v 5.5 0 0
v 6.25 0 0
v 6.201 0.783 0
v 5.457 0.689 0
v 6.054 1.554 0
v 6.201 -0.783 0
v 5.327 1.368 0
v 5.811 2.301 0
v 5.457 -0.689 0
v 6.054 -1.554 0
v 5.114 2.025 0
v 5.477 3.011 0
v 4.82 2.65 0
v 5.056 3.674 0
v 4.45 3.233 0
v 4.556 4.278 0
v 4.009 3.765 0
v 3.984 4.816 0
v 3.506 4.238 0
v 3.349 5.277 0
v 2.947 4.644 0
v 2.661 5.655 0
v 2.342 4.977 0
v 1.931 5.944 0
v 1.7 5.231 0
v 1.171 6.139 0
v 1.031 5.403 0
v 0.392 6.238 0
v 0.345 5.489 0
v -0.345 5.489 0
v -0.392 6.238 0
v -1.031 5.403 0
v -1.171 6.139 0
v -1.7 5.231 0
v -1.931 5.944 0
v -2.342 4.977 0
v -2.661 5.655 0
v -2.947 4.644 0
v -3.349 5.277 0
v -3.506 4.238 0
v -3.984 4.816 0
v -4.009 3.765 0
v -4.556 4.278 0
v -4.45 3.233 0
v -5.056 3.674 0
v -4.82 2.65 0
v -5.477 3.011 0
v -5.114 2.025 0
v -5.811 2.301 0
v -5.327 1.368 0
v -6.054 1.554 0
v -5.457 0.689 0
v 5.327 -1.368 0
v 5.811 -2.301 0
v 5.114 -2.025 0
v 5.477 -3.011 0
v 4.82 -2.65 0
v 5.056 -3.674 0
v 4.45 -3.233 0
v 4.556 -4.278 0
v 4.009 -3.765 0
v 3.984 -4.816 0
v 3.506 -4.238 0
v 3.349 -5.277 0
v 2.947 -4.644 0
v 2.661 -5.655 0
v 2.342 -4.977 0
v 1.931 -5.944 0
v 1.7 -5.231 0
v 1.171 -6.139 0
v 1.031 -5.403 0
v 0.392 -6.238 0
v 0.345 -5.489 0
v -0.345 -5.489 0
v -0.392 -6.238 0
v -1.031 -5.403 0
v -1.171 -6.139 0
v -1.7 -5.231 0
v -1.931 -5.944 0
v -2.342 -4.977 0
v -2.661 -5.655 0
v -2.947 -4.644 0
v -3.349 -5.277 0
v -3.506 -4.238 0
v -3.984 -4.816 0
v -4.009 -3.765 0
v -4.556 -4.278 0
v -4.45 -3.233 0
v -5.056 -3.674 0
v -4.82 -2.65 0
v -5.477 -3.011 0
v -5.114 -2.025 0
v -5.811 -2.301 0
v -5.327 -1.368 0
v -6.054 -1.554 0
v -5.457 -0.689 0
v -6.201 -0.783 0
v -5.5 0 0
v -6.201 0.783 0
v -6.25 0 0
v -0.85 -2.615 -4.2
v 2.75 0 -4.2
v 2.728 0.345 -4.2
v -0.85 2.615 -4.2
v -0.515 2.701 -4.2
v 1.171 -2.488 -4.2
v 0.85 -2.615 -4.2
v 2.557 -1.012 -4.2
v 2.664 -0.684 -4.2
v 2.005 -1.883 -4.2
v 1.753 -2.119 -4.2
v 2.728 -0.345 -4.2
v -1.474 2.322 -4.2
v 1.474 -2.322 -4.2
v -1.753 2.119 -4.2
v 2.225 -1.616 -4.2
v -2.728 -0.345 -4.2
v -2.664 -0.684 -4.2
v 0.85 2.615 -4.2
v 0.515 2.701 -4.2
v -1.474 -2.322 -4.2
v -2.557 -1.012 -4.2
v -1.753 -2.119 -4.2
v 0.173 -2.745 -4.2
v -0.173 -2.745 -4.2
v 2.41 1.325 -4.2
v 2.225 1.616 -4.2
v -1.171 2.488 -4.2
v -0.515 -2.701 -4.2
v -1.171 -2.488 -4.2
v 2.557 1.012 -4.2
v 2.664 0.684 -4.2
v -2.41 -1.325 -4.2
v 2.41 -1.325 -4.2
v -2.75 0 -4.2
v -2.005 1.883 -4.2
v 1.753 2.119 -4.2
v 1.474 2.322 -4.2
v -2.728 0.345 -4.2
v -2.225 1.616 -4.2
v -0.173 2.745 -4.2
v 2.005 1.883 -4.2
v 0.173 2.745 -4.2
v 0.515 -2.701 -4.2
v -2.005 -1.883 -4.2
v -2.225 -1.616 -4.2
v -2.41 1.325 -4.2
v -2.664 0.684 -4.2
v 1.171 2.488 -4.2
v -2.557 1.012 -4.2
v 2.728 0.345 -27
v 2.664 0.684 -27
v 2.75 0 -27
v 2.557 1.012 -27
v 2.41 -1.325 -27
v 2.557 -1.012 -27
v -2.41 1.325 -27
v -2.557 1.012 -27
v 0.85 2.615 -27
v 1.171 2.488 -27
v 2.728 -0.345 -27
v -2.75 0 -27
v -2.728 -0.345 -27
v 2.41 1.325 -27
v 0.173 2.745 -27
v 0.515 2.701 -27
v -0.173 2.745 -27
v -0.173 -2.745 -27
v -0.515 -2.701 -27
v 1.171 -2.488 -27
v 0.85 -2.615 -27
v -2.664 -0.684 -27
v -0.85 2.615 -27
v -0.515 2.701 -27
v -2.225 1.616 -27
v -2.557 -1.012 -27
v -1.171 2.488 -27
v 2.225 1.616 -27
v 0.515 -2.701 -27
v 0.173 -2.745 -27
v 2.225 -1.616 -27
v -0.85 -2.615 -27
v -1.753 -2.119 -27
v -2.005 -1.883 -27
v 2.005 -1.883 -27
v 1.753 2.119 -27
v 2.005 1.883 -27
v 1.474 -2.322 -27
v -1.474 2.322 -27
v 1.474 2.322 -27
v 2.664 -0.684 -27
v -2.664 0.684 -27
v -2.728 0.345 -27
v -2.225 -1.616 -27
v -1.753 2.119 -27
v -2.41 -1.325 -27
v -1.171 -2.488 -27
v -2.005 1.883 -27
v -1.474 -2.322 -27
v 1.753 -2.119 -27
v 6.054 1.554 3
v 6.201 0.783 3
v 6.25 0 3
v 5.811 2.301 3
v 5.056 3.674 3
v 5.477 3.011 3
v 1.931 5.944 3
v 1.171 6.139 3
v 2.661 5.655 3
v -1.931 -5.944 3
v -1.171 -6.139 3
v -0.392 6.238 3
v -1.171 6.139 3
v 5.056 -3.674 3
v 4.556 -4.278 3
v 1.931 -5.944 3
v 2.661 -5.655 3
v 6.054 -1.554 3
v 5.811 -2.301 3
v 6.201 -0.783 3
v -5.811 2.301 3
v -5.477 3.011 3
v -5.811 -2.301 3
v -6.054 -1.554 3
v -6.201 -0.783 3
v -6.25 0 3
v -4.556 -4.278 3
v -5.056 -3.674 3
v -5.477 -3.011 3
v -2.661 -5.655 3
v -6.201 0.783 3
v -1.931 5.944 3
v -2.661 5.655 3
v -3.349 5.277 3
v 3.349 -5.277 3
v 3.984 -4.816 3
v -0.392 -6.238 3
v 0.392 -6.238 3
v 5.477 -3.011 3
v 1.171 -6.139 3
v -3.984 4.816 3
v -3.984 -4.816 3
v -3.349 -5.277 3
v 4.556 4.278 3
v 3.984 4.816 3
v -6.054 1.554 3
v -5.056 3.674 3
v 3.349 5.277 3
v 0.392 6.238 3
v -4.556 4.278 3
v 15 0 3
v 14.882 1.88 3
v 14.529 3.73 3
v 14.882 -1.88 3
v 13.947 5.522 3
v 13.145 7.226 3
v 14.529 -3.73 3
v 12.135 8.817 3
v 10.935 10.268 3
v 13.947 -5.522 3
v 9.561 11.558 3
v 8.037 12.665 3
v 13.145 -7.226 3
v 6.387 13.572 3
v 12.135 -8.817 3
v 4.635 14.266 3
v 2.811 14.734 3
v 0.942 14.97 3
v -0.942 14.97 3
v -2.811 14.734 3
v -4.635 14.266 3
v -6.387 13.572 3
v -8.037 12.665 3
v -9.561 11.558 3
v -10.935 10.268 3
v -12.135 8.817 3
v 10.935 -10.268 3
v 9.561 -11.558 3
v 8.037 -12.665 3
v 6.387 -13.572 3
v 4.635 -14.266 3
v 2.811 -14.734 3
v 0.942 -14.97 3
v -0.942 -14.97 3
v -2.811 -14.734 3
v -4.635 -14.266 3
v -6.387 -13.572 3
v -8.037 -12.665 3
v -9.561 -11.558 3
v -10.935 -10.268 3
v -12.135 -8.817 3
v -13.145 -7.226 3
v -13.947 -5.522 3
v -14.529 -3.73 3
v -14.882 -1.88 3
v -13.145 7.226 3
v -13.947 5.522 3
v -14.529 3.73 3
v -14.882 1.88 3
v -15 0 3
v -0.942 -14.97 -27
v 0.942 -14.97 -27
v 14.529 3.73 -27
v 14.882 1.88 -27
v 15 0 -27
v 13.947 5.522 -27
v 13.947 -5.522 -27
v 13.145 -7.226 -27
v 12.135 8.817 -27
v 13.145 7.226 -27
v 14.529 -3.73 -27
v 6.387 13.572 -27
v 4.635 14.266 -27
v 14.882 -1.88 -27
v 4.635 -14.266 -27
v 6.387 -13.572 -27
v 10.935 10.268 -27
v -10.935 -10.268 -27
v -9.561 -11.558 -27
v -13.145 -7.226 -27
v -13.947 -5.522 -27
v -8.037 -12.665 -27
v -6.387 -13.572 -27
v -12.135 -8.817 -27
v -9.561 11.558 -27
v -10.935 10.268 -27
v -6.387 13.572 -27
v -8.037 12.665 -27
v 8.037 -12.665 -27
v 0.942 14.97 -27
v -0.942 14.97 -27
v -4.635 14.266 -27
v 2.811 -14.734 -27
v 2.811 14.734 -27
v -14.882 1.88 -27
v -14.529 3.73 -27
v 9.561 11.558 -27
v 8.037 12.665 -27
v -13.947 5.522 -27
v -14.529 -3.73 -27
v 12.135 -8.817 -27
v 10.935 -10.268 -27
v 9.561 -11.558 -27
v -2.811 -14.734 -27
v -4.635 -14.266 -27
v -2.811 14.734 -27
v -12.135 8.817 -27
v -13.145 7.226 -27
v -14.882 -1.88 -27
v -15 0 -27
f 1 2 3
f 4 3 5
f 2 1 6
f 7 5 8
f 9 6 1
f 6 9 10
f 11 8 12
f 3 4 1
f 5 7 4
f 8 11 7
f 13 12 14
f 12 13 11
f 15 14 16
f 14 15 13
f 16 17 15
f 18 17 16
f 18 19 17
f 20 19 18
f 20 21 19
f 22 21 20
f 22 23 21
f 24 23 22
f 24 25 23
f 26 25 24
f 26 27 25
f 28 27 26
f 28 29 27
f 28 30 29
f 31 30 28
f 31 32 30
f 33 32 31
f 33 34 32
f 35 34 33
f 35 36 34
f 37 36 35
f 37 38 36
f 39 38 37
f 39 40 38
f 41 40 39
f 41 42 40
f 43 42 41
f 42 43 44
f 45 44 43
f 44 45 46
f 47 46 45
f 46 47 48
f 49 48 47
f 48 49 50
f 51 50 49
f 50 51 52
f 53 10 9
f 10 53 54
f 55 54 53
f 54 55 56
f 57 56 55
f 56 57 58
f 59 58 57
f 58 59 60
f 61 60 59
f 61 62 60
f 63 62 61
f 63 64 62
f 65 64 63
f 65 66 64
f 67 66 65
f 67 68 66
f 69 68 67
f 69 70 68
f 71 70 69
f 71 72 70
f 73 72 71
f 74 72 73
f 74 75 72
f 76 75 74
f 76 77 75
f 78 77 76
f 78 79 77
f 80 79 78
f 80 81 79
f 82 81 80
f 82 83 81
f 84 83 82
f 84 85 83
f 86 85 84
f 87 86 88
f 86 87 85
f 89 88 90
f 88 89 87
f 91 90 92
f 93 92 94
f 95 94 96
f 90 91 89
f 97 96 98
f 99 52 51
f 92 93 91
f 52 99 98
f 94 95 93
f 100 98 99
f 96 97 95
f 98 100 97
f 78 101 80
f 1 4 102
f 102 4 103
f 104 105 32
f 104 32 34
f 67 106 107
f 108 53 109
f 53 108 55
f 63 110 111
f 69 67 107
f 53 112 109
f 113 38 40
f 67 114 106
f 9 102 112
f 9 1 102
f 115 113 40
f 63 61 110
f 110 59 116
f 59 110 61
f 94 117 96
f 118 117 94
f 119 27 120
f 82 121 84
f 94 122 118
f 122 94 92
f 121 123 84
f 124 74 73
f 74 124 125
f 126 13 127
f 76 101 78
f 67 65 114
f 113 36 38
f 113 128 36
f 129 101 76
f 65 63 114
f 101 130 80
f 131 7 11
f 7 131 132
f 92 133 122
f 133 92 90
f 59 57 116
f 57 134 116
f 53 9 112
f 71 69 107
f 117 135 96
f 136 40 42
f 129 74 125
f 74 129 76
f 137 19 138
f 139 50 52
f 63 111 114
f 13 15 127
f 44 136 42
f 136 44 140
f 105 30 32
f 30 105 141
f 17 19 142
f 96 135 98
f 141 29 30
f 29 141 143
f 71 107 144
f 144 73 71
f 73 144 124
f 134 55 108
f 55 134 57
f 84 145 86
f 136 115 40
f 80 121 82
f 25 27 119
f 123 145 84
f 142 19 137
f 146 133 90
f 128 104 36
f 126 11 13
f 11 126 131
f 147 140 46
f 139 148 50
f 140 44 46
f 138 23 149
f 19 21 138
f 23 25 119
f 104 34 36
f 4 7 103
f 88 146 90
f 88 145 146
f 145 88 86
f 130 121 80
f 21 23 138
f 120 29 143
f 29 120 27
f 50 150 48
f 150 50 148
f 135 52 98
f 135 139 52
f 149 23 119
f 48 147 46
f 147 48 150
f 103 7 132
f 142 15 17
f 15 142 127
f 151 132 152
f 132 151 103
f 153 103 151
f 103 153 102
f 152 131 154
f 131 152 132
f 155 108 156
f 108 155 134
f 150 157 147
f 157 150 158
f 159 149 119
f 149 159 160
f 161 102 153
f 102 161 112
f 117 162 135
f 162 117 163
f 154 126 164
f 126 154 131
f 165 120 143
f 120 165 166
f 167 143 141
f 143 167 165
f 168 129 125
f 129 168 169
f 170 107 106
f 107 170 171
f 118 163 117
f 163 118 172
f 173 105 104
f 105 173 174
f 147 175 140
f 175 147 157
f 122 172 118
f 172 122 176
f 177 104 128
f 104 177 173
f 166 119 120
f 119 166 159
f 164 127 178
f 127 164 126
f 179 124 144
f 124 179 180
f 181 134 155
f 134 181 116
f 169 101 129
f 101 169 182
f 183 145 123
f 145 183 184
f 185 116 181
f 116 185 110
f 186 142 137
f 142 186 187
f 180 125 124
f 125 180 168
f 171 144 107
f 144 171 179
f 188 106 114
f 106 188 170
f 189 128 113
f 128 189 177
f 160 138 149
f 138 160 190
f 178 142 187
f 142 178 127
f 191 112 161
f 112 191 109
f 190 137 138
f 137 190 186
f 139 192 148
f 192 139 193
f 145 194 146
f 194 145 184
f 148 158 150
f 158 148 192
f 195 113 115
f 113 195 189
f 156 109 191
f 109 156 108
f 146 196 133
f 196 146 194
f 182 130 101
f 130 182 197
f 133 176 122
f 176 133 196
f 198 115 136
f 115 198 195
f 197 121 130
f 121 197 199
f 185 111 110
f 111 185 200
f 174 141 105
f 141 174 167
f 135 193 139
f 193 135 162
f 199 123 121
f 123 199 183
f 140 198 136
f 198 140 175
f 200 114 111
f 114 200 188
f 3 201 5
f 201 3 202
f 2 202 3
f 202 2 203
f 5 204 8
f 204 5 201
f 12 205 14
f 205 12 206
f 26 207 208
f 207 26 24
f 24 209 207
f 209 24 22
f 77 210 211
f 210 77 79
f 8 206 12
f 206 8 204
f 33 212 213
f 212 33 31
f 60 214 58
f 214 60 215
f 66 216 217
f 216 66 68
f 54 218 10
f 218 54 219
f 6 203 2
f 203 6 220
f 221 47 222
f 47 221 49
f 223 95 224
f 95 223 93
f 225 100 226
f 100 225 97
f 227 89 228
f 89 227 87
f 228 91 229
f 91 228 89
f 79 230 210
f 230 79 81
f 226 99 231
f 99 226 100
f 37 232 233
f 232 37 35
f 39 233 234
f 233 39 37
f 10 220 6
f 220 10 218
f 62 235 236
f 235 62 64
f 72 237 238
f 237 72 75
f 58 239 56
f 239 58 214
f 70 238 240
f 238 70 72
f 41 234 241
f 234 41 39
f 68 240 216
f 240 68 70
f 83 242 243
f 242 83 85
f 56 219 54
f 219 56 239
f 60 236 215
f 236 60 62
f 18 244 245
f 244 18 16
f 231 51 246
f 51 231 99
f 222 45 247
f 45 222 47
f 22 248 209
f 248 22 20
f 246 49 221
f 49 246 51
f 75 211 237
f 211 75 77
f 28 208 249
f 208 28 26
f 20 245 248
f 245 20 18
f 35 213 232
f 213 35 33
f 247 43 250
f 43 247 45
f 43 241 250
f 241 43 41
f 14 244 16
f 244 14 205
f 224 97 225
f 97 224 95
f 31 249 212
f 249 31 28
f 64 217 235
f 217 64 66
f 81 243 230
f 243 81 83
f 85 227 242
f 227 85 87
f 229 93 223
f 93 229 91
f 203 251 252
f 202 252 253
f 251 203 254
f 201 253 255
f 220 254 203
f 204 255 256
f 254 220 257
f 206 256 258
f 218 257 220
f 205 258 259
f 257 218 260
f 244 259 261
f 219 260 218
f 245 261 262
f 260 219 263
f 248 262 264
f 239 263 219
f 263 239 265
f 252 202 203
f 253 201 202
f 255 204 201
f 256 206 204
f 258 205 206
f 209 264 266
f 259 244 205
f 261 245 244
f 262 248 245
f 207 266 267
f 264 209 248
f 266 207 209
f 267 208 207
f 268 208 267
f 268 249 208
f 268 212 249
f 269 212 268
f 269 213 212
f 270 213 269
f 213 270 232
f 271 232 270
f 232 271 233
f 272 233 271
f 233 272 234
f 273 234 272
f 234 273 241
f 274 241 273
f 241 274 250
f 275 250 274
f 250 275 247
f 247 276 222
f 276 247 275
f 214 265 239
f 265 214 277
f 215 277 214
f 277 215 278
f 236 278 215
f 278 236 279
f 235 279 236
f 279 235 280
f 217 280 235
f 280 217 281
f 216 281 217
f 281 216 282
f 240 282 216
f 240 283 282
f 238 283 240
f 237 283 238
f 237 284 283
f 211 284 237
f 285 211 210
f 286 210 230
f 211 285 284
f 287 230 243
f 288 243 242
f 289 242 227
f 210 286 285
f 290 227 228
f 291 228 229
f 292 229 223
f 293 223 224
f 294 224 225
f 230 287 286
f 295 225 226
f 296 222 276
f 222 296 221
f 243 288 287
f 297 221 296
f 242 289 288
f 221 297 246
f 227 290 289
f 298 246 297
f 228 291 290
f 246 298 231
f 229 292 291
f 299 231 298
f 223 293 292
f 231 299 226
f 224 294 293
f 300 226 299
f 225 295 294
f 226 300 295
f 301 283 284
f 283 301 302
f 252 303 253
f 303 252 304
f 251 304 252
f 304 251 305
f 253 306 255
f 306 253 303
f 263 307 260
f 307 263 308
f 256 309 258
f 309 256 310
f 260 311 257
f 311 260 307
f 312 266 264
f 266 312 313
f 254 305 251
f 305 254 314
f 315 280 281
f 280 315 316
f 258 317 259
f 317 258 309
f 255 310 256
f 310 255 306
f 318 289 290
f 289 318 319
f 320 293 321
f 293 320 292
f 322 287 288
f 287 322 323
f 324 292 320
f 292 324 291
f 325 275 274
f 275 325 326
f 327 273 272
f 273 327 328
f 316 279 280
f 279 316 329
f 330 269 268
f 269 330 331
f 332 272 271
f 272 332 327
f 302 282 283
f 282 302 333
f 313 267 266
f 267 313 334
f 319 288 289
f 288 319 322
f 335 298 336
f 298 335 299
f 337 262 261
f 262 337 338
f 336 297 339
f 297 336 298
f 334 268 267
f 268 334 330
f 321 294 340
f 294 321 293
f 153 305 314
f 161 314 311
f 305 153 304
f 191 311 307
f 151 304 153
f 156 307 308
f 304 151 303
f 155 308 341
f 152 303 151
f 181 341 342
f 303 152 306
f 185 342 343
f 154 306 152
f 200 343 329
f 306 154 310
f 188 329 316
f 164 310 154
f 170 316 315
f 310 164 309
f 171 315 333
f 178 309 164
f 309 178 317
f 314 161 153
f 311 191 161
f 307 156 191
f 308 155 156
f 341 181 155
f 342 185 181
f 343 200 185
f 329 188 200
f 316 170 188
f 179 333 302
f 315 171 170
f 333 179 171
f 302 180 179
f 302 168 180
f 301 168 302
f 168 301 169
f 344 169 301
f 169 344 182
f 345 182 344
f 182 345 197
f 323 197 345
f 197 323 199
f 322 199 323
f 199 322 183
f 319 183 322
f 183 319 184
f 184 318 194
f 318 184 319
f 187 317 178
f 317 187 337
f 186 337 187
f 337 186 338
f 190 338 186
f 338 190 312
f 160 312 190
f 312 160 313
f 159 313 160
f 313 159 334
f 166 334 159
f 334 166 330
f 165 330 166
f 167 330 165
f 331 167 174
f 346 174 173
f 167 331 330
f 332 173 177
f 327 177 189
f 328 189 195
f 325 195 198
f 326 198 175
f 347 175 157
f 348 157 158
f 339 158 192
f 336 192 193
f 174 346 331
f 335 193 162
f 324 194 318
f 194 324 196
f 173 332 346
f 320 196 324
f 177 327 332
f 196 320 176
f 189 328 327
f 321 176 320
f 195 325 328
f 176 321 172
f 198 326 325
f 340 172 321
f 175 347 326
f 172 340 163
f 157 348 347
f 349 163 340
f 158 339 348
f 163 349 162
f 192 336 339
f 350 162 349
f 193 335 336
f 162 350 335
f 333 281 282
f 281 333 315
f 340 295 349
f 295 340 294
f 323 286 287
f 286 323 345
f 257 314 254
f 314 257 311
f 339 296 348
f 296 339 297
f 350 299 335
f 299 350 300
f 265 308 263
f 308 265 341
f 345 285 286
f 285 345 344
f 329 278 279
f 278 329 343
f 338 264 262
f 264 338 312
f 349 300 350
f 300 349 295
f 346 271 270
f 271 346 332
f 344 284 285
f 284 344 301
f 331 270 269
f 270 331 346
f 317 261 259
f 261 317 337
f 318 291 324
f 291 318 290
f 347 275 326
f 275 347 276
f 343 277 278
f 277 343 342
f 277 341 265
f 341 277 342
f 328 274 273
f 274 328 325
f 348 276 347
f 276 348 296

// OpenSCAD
$fn = 50;

difference() {
	union() {
		translate(v = [0, 0, -27.0]) {
			cylinder(h = 30, r = 15.0);
		}
	}
	union() {
		translate(v = [0, 0, 0]) {
			rotate(a = [0, 0, 0]) {
				difference() {
					union() {
						translate(v = [0, 0, -30.0]) {
							cylinder(h = 30, r = 2.25);
						}
						translate(v = [0, 0, -4.2]) {
							cylinder(h = 4.2, r1 = 2.75, r2 = 5.5);
						}
						translate(v = [0, 0, -30.0]) {
							cylinder(h = 30, r = 2.75);
						}
						translate(v = [0, 0, -30.0]) {
							cylinder(h = 30, r = 2.25);
						}
					}
					union();
				}
			}
		}
		#cylinder(h = 3, r = 6.25);
	}
}
